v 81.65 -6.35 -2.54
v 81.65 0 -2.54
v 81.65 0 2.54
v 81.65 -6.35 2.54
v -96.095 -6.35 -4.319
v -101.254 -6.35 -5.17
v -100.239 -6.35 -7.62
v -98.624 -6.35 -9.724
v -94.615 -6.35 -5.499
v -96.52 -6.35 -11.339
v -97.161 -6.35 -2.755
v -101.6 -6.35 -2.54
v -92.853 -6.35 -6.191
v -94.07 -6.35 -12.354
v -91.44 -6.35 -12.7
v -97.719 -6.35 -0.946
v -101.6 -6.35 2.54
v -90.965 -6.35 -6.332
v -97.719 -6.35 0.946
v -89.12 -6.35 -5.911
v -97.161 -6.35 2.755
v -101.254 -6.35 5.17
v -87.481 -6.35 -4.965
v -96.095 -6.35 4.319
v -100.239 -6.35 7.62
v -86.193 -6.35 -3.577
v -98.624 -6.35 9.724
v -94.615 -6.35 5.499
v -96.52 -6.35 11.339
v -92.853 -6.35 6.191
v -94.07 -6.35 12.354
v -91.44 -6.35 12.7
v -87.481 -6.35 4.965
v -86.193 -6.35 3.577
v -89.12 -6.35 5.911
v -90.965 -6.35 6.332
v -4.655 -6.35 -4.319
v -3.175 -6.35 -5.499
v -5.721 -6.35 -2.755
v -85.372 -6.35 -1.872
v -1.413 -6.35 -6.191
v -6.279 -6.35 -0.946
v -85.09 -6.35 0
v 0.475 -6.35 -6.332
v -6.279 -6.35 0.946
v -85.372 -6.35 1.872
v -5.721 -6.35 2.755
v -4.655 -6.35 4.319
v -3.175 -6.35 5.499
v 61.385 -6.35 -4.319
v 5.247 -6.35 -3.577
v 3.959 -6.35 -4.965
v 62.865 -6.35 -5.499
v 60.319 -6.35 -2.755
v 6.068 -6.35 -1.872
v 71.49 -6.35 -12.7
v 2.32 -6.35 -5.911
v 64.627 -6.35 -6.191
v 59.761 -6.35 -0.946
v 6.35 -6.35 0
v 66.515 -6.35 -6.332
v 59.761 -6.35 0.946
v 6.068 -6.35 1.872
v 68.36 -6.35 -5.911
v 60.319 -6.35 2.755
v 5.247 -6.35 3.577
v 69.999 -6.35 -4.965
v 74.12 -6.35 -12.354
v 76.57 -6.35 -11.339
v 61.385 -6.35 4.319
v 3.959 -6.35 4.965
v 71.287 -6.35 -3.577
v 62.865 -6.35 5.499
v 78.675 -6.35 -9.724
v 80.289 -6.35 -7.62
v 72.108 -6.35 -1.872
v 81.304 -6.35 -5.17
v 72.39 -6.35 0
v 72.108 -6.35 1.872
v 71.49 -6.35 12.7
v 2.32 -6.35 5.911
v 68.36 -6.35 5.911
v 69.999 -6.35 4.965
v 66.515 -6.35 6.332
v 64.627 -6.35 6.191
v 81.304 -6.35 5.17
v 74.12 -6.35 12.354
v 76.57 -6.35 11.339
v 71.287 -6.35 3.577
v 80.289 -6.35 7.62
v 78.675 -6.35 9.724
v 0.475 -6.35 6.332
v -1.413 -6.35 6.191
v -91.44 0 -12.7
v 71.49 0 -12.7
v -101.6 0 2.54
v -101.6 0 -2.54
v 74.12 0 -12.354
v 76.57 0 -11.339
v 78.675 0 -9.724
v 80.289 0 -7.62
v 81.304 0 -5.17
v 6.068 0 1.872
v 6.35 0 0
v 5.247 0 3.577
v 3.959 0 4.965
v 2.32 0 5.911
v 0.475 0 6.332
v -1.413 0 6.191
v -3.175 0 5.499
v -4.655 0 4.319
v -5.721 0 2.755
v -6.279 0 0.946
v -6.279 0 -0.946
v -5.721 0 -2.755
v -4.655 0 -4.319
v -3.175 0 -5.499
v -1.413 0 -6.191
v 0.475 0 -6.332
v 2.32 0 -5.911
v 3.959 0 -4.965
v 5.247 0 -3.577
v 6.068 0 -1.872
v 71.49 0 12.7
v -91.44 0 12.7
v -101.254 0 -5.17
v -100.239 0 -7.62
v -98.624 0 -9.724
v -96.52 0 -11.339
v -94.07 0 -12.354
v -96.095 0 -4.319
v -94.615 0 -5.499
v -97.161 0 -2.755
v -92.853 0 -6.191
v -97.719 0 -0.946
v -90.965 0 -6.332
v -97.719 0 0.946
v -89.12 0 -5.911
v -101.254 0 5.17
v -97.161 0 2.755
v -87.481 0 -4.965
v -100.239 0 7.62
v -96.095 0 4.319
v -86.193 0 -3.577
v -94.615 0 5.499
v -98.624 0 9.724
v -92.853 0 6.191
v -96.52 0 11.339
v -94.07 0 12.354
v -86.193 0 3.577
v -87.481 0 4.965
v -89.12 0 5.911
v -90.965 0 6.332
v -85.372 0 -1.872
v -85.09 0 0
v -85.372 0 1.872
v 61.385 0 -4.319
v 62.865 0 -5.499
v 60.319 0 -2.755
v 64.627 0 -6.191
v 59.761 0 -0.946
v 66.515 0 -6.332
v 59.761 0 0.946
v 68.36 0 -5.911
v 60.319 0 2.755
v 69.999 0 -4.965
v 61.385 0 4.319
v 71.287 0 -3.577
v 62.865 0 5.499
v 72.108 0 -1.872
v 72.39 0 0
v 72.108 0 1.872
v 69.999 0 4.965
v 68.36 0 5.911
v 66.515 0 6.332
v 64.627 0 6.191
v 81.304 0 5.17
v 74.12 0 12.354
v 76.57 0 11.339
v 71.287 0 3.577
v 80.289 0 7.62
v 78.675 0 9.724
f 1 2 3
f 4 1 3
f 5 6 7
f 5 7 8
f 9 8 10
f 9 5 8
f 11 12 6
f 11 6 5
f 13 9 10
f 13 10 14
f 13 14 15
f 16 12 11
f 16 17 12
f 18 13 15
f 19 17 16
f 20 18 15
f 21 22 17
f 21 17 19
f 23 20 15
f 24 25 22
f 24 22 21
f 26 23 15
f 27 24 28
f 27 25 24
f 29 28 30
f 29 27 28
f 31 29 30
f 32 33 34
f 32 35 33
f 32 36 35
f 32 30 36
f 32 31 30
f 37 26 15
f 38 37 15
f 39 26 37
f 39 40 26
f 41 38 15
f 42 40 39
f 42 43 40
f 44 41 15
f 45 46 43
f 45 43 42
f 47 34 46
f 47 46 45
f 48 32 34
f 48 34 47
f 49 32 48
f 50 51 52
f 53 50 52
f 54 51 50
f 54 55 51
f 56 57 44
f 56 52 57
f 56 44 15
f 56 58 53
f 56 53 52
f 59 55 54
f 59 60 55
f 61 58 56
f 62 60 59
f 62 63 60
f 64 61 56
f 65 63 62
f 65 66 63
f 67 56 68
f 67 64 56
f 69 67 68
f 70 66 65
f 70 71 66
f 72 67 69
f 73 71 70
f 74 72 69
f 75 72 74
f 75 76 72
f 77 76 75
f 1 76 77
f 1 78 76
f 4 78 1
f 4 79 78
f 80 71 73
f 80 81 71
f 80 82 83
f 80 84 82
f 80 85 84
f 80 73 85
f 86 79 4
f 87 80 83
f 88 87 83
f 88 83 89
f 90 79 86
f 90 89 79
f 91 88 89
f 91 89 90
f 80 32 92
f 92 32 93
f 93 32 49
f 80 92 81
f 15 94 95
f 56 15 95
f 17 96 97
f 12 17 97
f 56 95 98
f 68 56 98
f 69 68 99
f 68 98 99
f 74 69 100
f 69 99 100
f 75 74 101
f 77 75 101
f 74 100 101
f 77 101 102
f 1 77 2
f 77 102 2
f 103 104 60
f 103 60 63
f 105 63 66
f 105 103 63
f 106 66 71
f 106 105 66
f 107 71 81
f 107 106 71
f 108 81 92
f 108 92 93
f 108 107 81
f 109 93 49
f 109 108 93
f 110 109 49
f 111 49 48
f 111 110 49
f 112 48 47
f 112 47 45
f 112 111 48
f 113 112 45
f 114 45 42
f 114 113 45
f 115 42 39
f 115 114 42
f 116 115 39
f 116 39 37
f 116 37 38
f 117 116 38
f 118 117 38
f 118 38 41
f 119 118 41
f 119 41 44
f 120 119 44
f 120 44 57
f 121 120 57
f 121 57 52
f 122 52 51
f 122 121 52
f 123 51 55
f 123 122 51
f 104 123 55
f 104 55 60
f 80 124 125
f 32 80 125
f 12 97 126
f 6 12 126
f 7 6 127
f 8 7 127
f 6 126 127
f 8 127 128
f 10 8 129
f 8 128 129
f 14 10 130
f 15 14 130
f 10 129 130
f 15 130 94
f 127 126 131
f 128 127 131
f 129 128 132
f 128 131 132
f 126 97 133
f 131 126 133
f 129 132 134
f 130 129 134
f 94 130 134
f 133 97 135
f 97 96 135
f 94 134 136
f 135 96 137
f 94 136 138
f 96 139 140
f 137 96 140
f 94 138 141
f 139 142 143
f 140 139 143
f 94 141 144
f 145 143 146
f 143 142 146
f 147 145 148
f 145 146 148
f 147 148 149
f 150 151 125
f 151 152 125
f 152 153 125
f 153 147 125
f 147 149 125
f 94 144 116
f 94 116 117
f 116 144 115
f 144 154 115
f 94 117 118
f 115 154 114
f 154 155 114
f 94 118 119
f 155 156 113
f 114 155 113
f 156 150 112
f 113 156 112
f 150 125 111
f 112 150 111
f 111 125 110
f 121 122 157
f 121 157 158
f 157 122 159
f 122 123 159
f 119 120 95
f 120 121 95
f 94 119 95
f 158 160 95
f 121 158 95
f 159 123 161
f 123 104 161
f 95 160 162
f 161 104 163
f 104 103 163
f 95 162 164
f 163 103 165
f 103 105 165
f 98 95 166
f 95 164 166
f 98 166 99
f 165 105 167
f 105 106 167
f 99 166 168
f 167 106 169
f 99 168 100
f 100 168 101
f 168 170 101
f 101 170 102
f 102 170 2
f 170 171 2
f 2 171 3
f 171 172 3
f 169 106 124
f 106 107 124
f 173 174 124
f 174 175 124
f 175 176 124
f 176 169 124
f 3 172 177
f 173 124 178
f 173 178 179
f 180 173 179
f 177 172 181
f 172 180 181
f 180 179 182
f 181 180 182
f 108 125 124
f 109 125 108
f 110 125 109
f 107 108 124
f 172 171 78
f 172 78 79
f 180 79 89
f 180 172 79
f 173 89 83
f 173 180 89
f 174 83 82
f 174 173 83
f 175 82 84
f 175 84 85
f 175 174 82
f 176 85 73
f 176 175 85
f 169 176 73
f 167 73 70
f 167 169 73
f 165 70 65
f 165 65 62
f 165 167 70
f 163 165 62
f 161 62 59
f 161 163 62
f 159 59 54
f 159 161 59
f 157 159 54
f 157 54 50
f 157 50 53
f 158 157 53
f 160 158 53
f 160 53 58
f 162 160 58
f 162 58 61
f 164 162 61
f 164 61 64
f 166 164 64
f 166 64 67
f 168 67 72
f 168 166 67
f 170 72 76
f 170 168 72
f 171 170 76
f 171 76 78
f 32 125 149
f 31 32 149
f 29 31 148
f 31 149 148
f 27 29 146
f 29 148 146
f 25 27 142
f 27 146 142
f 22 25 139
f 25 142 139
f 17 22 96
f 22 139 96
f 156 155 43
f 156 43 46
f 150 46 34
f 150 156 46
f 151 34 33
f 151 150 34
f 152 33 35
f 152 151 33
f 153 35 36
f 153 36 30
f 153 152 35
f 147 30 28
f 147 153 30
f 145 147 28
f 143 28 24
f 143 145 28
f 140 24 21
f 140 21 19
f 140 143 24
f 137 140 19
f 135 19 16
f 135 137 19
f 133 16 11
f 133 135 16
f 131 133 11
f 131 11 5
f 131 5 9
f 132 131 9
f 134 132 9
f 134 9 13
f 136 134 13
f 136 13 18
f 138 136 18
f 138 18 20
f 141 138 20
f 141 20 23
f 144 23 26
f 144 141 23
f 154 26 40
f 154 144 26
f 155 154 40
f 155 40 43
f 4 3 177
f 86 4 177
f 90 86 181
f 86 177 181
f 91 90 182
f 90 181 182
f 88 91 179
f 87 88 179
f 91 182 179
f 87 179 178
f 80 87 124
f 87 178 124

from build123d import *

# Parameters (mm, degrees)
F0_R     = 6.35
F1_DEPTH = 6.35


with BuildPart() as f1:
    # F0 (on Front) → F1 (new body)
    with BuildSketch(Plane.XZ):
        with BuildLine():
            ThreePointArc((81.650485, 2.54), (78.67469, 9.724205), (71.490485, 12.7))
            Line((71.490485, 12.7), (-91.44, 12.7))
            ThreePointArc((-91.44, 12.7), (-98.624205, 9.724205), (-101.6, 2.54))
            Line((-101.6, 2.54), (-101.6, -2.54))
            ThreePointArc((-101.6, -2.54), (-98.624205, -9.724205), (-91.44, -12.7))
            Line((-91.44, -12.7), (71.490485, -12.7))
            ThreePointArc((71.490485, -12.7), (78.67469, -9.724205), (81.650485, -2.54))
            Line((81.650485, -2.54), (81.650485, 2.54))
        make_face()
        with Locations((-91.44, 0)):
            Circle(F0_R, mode=Mode.SUBTRACT)
        Circle(F0_R, mode=Mode.SUBTRACT)
        with Locations((66.04, 0)):
            Circle(F0_R, mode=Mode.SUBTRACT)
    extrude(amount=F1_DEPTH)


solid = f1.part
